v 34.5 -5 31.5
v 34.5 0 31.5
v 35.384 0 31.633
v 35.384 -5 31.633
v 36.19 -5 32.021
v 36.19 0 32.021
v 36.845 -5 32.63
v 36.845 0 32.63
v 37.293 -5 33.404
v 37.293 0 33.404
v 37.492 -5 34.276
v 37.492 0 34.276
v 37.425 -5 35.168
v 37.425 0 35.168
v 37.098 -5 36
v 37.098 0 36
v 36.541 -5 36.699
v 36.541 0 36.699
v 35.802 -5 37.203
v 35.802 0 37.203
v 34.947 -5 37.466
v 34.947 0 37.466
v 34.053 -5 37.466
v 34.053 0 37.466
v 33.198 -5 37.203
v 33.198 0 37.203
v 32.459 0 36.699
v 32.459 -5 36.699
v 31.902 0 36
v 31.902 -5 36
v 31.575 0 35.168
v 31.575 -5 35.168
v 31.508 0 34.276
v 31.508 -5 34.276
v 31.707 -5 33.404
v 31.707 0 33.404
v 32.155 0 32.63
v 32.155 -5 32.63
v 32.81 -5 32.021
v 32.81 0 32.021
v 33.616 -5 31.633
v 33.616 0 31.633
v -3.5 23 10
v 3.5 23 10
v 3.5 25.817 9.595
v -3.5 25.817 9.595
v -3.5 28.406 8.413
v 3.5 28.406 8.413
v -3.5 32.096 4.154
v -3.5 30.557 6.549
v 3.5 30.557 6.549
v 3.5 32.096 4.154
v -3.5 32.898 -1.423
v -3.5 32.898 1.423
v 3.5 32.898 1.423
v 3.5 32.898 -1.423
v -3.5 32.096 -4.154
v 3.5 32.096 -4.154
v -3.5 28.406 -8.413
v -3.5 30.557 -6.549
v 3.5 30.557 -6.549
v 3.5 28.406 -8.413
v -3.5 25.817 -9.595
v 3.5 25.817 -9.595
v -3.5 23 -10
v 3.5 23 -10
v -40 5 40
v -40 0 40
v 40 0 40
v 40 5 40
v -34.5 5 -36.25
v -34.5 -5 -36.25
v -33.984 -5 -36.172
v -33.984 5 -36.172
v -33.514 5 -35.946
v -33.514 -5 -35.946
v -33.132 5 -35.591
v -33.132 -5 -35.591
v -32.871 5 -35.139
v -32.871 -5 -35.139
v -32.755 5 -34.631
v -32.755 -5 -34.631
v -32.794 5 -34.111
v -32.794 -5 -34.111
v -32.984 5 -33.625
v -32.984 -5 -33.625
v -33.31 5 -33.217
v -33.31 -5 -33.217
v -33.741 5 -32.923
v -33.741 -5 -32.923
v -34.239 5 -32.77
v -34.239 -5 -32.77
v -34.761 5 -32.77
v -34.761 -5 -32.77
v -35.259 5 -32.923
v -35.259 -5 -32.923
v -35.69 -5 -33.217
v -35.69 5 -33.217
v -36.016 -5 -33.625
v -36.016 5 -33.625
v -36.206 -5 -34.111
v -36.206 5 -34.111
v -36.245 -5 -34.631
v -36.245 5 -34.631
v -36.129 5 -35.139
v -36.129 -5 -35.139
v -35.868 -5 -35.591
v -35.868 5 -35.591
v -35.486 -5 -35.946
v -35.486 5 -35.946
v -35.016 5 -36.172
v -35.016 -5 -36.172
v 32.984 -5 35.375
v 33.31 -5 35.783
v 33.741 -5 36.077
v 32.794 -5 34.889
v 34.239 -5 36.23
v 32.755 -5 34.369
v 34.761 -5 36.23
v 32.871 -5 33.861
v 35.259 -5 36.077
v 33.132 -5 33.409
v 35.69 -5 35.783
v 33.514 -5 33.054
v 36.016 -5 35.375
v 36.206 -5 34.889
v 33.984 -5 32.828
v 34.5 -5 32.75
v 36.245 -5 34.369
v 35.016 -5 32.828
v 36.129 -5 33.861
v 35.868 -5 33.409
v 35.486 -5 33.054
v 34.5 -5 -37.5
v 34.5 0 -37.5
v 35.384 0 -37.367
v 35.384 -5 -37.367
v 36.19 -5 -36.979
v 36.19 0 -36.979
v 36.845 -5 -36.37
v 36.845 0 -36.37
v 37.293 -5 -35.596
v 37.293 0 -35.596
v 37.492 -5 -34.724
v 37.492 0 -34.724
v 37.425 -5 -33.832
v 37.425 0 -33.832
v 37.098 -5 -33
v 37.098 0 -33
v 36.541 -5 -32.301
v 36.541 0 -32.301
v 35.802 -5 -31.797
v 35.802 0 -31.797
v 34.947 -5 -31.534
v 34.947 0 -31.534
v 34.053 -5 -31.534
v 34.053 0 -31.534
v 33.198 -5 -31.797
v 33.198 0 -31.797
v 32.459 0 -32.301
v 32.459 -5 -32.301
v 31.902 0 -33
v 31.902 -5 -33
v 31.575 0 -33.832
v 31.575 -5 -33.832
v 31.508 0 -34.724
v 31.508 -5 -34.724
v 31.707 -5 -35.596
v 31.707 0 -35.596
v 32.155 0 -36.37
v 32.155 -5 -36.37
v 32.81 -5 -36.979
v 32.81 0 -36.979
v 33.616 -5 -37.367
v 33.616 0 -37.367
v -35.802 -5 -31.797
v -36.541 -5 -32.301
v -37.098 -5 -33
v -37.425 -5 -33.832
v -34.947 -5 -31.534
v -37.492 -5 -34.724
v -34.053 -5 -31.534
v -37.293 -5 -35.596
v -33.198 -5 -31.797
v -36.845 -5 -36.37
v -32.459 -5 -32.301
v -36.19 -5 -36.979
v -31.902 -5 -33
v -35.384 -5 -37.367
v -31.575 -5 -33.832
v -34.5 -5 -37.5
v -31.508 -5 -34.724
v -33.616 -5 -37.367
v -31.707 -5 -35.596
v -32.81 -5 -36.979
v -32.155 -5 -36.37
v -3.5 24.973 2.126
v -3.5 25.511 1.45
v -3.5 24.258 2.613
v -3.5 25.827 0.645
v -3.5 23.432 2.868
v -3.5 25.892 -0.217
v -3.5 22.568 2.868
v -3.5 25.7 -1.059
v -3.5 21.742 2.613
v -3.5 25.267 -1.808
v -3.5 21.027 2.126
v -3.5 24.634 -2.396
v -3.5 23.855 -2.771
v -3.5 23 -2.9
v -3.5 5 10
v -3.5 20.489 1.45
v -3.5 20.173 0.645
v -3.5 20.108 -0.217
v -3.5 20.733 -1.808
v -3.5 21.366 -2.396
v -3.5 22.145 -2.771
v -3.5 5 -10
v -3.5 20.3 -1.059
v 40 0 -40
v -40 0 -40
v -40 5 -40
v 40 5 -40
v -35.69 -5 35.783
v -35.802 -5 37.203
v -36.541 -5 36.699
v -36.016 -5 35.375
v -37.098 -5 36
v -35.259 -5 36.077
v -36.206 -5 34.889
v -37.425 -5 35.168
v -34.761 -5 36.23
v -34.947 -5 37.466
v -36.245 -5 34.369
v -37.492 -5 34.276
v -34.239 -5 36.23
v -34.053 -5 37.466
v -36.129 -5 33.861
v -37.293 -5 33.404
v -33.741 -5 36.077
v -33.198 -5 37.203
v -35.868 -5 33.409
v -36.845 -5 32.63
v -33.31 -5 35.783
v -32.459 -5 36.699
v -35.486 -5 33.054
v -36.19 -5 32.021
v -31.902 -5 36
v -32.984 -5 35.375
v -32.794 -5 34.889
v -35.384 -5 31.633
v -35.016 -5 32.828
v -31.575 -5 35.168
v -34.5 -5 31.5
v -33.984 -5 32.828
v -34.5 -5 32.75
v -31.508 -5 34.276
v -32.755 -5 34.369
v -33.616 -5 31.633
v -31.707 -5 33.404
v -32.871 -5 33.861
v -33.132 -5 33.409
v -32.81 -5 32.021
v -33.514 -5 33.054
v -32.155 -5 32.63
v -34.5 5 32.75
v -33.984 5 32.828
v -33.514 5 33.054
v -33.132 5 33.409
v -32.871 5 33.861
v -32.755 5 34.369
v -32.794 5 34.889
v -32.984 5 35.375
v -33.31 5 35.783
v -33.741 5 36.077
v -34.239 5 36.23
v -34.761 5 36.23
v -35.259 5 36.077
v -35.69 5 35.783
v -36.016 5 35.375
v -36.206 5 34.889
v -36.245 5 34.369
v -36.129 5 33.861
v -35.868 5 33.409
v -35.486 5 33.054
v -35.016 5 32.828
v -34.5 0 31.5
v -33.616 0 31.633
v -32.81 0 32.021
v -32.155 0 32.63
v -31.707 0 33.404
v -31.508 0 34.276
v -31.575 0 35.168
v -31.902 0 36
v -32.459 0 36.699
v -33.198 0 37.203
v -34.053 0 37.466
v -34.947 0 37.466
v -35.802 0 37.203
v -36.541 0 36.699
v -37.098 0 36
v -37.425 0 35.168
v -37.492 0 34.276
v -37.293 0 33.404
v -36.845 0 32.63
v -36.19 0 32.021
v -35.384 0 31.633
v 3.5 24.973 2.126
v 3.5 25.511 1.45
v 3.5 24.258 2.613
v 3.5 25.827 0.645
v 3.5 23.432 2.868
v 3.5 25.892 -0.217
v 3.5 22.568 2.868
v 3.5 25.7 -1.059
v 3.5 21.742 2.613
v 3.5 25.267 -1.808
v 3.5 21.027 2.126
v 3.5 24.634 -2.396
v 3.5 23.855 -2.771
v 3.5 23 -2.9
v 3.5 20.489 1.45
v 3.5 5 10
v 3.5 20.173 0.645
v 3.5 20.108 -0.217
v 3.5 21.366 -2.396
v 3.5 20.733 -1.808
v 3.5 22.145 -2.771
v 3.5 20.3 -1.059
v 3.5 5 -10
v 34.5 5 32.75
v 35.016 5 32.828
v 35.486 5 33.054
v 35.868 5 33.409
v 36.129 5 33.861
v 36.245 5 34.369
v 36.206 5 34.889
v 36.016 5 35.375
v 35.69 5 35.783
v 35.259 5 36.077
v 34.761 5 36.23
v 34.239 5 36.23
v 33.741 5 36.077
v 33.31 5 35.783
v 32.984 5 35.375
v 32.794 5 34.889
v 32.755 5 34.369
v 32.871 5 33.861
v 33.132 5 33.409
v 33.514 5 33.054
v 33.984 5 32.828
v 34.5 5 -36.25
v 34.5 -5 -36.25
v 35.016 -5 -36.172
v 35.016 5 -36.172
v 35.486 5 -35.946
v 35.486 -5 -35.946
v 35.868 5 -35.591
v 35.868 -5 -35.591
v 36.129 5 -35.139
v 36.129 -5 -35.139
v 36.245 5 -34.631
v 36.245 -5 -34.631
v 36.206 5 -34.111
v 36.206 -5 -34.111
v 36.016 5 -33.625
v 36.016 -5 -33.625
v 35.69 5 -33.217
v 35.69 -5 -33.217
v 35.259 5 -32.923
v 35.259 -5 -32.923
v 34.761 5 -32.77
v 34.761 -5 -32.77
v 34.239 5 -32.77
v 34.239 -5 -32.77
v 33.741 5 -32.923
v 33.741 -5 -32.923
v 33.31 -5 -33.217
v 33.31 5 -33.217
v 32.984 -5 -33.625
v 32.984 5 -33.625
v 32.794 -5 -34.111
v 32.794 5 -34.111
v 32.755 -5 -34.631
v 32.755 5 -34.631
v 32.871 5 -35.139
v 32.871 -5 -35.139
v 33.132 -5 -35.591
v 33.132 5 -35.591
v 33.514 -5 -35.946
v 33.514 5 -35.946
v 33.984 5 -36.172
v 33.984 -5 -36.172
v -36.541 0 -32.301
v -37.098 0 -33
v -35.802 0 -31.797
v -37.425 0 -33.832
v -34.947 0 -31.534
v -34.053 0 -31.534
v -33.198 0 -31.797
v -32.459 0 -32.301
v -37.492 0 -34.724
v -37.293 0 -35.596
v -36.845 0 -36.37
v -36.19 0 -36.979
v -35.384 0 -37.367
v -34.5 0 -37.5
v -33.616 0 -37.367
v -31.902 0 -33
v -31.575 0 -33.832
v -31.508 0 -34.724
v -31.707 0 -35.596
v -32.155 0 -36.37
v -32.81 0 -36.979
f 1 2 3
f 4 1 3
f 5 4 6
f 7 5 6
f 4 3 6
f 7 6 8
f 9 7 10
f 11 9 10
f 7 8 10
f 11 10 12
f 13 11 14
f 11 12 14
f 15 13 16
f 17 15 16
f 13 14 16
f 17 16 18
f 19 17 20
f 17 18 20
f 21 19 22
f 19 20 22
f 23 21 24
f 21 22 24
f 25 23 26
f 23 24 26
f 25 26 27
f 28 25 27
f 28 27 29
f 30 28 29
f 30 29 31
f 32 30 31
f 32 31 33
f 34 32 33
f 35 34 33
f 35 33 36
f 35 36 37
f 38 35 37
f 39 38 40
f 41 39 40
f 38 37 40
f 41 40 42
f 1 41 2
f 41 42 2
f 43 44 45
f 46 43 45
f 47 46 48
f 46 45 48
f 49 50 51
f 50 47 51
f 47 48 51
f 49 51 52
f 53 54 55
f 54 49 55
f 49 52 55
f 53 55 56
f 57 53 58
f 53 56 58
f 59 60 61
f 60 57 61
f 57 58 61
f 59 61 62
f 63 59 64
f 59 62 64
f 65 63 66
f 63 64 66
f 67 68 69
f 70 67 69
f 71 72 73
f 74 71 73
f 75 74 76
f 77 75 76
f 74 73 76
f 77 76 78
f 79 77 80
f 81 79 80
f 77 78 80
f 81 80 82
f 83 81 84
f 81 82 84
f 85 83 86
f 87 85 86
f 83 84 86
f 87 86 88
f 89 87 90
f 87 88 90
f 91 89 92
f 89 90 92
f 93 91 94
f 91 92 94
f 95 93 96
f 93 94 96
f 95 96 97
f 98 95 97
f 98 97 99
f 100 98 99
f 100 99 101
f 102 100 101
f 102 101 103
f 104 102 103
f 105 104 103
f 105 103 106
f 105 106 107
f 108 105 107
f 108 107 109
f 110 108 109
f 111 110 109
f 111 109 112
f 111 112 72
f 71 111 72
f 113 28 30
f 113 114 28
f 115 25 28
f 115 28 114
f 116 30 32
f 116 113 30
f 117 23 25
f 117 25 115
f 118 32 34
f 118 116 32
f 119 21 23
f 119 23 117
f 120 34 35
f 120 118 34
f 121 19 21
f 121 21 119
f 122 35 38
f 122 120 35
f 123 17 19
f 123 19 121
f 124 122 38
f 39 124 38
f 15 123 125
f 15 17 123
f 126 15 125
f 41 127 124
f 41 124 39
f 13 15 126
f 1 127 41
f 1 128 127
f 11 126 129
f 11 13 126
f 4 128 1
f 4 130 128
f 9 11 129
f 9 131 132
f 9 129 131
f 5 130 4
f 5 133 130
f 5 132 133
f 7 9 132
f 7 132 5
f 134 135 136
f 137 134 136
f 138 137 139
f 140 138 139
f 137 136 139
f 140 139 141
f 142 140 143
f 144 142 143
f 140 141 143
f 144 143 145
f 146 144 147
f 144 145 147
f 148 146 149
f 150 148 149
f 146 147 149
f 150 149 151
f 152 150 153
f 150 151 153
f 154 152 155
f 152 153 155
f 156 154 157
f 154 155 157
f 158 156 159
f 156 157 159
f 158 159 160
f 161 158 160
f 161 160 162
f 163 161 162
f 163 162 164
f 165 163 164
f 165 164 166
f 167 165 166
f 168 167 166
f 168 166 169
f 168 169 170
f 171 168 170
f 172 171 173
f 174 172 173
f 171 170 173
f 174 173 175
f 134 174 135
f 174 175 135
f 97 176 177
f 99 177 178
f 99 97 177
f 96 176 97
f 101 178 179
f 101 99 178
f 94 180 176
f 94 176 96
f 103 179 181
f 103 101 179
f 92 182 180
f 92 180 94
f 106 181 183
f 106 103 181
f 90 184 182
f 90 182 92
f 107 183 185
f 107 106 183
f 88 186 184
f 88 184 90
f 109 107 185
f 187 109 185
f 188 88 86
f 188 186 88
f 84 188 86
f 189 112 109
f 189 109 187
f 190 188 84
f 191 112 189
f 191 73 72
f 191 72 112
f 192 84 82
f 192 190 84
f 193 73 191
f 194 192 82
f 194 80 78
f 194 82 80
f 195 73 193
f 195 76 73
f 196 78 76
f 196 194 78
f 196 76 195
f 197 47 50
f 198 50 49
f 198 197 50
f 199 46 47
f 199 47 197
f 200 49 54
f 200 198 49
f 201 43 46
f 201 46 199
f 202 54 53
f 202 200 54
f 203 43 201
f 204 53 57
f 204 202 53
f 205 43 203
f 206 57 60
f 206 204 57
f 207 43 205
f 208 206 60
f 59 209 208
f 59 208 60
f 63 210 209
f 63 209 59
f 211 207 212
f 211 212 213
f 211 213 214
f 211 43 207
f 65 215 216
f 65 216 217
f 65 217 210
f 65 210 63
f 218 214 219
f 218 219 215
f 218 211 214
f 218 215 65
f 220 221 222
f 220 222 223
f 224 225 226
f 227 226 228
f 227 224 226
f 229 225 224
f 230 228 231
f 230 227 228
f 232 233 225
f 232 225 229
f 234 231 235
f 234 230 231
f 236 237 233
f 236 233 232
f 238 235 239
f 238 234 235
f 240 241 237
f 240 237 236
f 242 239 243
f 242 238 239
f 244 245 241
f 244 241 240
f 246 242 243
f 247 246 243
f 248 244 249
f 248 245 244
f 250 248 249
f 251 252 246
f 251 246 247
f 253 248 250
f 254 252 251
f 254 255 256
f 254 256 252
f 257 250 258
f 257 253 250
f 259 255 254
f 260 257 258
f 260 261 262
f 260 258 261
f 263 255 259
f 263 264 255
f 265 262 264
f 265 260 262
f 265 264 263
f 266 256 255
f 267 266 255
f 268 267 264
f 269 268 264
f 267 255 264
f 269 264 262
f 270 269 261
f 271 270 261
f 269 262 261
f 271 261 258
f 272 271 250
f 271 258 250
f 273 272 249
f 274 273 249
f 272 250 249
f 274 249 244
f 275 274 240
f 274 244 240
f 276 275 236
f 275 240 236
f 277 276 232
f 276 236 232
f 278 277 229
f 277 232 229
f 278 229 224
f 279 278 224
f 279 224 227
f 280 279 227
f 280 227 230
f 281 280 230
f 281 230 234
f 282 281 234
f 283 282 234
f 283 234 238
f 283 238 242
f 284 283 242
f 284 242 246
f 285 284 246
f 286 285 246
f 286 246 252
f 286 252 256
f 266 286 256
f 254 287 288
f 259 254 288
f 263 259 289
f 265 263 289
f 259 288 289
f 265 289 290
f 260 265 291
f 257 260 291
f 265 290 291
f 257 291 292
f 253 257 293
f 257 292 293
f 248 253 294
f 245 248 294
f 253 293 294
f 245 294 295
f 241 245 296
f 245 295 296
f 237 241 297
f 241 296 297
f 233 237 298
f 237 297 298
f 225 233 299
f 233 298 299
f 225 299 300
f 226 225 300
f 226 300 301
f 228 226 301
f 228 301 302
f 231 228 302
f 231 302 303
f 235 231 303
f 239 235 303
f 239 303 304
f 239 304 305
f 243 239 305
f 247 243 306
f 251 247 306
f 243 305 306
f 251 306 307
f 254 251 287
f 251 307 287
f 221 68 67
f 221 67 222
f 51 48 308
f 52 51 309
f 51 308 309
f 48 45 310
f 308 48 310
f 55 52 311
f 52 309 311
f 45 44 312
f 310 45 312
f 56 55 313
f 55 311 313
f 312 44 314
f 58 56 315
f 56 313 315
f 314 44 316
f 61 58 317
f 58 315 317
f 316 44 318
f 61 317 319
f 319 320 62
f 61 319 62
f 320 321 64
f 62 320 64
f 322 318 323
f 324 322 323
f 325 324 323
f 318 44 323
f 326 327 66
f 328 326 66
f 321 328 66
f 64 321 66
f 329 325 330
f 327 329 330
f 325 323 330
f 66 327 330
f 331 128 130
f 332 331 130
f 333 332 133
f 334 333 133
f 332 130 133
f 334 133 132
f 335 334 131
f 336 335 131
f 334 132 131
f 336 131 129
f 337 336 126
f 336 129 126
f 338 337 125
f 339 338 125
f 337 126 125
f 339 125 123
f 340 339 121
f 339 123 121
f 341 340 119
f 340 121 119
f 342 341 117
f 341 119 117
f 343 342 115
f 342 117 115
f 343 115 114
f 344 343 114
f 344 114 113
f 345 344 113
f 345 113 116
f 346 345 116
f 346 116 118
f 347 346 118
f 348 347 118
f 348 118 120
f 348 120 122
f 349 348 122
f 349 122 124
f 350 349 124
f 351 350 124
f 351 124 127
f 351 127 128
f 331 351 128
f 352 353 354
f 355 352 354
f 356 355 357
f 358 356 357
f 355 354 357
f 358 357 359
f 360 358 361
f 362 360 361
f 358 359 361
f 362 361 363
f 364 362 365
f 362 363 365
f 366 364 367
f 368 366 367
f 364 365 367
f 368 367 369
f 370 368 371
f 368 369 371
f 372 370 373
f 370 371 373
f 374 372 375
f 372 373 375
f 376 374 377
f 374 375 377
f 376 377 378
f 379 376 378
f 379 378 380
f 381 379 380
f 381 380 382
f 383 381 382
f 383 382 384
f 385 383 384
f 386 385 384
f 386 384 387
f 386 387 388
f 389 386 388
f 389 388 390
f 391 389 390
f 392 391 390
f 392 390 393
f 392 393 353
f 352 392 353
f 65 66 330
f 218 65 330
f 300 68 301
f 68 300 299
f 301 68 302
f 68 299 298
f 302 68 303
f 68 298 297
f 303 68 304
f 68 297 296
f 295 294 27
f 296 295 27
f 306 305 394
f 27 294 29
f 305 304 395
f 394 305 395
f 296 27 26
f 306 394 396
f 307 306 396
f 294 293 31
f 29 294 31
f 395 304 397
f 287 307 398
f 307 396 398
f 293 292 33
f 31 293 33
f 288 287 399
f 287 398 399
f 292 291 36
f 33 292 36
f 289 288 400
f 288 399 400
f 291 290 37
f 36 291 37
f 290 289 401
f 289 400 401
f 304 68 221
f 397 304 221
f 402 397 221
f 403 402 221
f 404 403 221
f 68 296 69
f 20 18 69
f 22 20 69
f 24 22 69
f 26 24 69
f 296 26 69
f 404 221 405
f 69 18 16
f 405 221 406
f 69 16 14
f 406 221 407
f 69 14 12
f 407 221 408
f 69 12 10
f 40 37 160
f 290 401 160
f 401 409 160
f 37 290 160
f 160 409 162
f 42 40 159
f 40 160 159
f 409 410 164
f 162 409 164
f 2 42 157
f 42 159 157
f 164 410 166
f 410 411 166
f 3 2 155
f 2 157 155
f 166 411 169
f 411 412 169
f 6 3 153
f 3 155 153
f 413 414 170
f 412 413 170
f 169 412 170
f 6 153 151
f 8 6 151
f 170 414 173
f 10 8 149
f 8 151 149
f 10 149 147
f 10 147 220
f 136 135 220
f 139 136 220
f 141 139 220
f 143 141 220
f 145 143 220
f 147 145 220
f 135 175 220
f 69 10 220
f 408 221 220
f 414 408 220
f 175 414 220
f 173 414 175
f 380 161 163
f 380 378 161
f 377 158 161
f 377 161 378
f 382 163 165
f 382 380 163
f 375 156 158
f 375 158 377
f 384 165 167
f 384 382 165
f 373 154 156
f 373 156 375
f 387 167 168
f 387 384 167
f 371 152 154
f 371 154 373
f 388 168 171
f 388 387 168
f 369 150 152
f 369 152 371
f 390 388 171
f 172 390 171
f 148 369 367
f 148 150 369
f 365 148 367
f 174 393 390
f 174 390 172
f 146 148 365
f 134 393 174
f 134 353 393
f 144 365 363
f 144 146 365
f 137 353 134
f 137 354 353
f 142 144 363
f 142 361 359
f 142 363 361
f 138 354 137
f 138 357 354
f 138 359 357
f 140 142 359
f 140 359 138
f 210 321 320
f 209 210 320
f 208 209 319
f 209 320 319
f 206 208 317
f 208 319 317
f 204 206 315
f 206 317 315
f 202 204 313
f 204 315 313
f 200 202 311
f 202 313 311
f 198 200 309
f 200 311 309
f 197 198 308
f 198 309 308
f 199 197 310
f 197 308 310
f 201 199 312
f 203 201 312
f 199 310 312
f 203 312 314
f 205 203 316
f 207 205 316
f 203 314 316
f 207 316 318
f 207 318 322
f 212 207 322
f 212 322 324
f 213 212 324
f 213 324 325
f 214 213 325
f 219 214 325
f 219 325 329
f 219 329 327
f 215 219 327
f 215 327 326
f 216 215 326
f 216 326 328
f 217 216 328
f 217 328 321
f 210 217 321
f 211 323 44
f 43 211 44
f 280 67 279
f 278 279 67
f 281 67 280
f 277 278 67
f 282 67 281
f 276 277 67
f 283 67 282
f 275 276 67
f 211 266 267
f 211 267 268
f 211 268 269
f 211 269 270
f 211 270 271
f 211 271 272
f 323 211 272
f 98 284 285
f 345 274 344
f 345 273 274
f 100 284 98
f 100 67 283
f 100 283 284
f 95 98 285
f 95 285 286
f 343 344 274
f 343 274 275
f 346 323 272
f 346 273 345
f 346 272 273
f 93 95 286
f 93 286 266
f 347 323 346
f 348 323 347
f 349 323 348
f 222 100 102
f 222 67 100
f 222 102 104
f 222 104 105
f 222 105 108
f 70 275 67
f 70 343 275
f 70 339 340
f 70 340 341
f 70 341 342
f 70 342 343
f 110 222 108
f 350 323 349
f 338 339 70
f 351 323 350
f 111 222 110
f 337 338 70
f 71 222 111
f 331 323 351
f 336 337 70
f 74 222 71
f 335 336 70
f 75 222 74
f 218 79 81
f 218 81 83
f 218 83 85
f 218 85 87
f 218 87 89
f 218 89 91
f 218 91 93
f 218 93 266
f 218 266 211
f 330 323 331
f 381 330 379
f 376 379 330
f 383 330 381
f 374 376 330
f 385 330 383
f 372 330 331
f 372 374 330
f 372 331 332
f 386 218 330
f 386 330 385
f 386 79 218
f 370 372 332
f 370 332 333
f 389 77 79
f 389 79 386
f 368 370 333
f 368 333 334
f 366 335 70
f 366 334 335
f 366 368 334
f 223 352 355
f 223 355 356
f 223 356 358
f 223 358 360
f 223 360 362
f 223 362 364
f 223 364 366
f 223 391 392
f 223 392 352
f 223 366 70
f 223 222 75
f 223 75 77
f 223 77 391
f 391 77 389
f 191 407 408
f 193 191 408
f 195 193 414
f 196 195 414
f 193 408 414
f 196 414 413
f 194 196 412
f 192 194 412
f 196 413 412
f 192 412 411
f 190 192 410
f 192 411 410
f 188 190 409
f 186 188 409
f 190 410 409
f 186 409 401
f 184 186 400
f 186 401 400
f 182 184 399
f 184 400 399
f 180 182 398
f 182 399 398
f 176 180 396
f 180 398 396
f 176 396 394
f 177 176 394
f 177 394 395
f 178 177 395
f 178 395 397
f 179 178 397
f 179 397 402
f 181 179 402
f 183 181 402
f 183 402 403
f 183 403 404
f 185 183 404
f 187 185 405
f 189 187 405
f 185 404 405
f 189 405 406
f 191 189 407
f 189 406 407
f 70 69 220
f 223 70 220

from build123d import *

# Parameters (mm, degrees)
SKETCH2_W           = 80
SKETCH2_H           = 80
BOSS_EXTRUDE1_DEPTH = 5
SKETCH9_R           = 3
BOSS_EXTRUDE3_DEPTH = 5
SKETCH10_R          = 1.75
CUT_EXTRUDE6_DEPTH  = 58.445626465
SKETCH11_R          = 2.9
BOSS_EXTRUDE4_DEPTH = 80
SKETCH12_W          = 80
SKETCH12_H          = 80
SKETCH12_W_2        = 7
SKETCH12_H_2        = 20
CUT_EXTRUDE7_DEPTH  = 64.118935352


with BuildPart() as part:
    # Sketch2 → Boss-Extrude1 (new body)
    with BuildSketch(Plane(origin=(0, 0, 0), x_dir=(1, 0, 0), z_dir=(0, 1, 0))):
        Rectangle(SKETCH2_W, SKETCH2_H)
    extrude(amount=BOSS_EXTRUDE1_DEPTH)

    # Sketch9 → Boss-Extrude3 (add)
    with BuildSketch(Plane.XZ):
        with Locations(Location((-34.5, 34.5, 0), (0, 0, 270))):
            Circle(SKETCH9_R)
        with Locations(Location((34.5, 34.5, 0), (0, 0, 270))):
            Circle(SKETCH9_R)
        with Locations(Location((-34.5, -34.5, 0), (0, 0, 270))):
            Circle(SKETCH9_R)
        with Locations(Location((34.5, -34.5, 0), (0, 0, 270))):
            Circle(SKETCH9_R)
    extrude(amount=BOSS_EXTRUDE3_DEPTH)

    # Sketch10 → Cut-Extrude6 (cut, through all)
    with BuildSketch(Plane.XZ.offset(5)):
        with Locations(Location((-34.5, -34.5, 0), (0, 0, 270))):
            Circle(SKETCH10_R)
        with Locations(Location((-34.5, 34.5, 0), (0, 0, 270))):
            Circle(SKETCH10_R)
        with Locations(Location((34.5, 34.5, 0), (0, 0, 270))):
            Circle(SKETCH10_R)
        with Locations(Location((34.5, -34.5, 0), (0, 0, 270))):
            Circle(SKETCH10_R)
    extrude(amount=-CUT_EXTRUDE6_DEPTH, mode=Mode.SUBTRACT)

    # Sketch11 → Boss-Extrude4 (add)
    with BuildSketch(Plane(origin=(40, 0, 0), x_dir=(0, 0, -1), z_dir=(1, 0, 0))):
        with BuildLine():
            Line((-10, 5), (-10, 23))
            ThreePointArc((-10, 23), (0, 33), (10, 23))
            Line((10, 23), (10, 5))
            Line((10, 5), (-10, 5))
        make_face()
        with Locations((0, 23)):
            Circle(SKETCH11_R, mode=Mode.SUBTRACT)
    extrude(amount=-BOSS_EXTRUDE4_DEPTH)

    # Sketch12 → Cut-Extrude7 (cut, through all)
    with BuildSketch(Plane(origin=(0, 5, 0), x_dir=(1, 0, 0), z_dir=(0, 1, 0))):
        Rectangle(SKETCH12_W, SKETCH12_H)
        Rectangle(SKETCH12_W_2, SKETCH12_H_2, mode=Mode.SUBTRACT)
    extrude(amount=CUT_EXTRUDE7_DEPTH, mode=Mode.SUBTRACT)


solid = part.part
